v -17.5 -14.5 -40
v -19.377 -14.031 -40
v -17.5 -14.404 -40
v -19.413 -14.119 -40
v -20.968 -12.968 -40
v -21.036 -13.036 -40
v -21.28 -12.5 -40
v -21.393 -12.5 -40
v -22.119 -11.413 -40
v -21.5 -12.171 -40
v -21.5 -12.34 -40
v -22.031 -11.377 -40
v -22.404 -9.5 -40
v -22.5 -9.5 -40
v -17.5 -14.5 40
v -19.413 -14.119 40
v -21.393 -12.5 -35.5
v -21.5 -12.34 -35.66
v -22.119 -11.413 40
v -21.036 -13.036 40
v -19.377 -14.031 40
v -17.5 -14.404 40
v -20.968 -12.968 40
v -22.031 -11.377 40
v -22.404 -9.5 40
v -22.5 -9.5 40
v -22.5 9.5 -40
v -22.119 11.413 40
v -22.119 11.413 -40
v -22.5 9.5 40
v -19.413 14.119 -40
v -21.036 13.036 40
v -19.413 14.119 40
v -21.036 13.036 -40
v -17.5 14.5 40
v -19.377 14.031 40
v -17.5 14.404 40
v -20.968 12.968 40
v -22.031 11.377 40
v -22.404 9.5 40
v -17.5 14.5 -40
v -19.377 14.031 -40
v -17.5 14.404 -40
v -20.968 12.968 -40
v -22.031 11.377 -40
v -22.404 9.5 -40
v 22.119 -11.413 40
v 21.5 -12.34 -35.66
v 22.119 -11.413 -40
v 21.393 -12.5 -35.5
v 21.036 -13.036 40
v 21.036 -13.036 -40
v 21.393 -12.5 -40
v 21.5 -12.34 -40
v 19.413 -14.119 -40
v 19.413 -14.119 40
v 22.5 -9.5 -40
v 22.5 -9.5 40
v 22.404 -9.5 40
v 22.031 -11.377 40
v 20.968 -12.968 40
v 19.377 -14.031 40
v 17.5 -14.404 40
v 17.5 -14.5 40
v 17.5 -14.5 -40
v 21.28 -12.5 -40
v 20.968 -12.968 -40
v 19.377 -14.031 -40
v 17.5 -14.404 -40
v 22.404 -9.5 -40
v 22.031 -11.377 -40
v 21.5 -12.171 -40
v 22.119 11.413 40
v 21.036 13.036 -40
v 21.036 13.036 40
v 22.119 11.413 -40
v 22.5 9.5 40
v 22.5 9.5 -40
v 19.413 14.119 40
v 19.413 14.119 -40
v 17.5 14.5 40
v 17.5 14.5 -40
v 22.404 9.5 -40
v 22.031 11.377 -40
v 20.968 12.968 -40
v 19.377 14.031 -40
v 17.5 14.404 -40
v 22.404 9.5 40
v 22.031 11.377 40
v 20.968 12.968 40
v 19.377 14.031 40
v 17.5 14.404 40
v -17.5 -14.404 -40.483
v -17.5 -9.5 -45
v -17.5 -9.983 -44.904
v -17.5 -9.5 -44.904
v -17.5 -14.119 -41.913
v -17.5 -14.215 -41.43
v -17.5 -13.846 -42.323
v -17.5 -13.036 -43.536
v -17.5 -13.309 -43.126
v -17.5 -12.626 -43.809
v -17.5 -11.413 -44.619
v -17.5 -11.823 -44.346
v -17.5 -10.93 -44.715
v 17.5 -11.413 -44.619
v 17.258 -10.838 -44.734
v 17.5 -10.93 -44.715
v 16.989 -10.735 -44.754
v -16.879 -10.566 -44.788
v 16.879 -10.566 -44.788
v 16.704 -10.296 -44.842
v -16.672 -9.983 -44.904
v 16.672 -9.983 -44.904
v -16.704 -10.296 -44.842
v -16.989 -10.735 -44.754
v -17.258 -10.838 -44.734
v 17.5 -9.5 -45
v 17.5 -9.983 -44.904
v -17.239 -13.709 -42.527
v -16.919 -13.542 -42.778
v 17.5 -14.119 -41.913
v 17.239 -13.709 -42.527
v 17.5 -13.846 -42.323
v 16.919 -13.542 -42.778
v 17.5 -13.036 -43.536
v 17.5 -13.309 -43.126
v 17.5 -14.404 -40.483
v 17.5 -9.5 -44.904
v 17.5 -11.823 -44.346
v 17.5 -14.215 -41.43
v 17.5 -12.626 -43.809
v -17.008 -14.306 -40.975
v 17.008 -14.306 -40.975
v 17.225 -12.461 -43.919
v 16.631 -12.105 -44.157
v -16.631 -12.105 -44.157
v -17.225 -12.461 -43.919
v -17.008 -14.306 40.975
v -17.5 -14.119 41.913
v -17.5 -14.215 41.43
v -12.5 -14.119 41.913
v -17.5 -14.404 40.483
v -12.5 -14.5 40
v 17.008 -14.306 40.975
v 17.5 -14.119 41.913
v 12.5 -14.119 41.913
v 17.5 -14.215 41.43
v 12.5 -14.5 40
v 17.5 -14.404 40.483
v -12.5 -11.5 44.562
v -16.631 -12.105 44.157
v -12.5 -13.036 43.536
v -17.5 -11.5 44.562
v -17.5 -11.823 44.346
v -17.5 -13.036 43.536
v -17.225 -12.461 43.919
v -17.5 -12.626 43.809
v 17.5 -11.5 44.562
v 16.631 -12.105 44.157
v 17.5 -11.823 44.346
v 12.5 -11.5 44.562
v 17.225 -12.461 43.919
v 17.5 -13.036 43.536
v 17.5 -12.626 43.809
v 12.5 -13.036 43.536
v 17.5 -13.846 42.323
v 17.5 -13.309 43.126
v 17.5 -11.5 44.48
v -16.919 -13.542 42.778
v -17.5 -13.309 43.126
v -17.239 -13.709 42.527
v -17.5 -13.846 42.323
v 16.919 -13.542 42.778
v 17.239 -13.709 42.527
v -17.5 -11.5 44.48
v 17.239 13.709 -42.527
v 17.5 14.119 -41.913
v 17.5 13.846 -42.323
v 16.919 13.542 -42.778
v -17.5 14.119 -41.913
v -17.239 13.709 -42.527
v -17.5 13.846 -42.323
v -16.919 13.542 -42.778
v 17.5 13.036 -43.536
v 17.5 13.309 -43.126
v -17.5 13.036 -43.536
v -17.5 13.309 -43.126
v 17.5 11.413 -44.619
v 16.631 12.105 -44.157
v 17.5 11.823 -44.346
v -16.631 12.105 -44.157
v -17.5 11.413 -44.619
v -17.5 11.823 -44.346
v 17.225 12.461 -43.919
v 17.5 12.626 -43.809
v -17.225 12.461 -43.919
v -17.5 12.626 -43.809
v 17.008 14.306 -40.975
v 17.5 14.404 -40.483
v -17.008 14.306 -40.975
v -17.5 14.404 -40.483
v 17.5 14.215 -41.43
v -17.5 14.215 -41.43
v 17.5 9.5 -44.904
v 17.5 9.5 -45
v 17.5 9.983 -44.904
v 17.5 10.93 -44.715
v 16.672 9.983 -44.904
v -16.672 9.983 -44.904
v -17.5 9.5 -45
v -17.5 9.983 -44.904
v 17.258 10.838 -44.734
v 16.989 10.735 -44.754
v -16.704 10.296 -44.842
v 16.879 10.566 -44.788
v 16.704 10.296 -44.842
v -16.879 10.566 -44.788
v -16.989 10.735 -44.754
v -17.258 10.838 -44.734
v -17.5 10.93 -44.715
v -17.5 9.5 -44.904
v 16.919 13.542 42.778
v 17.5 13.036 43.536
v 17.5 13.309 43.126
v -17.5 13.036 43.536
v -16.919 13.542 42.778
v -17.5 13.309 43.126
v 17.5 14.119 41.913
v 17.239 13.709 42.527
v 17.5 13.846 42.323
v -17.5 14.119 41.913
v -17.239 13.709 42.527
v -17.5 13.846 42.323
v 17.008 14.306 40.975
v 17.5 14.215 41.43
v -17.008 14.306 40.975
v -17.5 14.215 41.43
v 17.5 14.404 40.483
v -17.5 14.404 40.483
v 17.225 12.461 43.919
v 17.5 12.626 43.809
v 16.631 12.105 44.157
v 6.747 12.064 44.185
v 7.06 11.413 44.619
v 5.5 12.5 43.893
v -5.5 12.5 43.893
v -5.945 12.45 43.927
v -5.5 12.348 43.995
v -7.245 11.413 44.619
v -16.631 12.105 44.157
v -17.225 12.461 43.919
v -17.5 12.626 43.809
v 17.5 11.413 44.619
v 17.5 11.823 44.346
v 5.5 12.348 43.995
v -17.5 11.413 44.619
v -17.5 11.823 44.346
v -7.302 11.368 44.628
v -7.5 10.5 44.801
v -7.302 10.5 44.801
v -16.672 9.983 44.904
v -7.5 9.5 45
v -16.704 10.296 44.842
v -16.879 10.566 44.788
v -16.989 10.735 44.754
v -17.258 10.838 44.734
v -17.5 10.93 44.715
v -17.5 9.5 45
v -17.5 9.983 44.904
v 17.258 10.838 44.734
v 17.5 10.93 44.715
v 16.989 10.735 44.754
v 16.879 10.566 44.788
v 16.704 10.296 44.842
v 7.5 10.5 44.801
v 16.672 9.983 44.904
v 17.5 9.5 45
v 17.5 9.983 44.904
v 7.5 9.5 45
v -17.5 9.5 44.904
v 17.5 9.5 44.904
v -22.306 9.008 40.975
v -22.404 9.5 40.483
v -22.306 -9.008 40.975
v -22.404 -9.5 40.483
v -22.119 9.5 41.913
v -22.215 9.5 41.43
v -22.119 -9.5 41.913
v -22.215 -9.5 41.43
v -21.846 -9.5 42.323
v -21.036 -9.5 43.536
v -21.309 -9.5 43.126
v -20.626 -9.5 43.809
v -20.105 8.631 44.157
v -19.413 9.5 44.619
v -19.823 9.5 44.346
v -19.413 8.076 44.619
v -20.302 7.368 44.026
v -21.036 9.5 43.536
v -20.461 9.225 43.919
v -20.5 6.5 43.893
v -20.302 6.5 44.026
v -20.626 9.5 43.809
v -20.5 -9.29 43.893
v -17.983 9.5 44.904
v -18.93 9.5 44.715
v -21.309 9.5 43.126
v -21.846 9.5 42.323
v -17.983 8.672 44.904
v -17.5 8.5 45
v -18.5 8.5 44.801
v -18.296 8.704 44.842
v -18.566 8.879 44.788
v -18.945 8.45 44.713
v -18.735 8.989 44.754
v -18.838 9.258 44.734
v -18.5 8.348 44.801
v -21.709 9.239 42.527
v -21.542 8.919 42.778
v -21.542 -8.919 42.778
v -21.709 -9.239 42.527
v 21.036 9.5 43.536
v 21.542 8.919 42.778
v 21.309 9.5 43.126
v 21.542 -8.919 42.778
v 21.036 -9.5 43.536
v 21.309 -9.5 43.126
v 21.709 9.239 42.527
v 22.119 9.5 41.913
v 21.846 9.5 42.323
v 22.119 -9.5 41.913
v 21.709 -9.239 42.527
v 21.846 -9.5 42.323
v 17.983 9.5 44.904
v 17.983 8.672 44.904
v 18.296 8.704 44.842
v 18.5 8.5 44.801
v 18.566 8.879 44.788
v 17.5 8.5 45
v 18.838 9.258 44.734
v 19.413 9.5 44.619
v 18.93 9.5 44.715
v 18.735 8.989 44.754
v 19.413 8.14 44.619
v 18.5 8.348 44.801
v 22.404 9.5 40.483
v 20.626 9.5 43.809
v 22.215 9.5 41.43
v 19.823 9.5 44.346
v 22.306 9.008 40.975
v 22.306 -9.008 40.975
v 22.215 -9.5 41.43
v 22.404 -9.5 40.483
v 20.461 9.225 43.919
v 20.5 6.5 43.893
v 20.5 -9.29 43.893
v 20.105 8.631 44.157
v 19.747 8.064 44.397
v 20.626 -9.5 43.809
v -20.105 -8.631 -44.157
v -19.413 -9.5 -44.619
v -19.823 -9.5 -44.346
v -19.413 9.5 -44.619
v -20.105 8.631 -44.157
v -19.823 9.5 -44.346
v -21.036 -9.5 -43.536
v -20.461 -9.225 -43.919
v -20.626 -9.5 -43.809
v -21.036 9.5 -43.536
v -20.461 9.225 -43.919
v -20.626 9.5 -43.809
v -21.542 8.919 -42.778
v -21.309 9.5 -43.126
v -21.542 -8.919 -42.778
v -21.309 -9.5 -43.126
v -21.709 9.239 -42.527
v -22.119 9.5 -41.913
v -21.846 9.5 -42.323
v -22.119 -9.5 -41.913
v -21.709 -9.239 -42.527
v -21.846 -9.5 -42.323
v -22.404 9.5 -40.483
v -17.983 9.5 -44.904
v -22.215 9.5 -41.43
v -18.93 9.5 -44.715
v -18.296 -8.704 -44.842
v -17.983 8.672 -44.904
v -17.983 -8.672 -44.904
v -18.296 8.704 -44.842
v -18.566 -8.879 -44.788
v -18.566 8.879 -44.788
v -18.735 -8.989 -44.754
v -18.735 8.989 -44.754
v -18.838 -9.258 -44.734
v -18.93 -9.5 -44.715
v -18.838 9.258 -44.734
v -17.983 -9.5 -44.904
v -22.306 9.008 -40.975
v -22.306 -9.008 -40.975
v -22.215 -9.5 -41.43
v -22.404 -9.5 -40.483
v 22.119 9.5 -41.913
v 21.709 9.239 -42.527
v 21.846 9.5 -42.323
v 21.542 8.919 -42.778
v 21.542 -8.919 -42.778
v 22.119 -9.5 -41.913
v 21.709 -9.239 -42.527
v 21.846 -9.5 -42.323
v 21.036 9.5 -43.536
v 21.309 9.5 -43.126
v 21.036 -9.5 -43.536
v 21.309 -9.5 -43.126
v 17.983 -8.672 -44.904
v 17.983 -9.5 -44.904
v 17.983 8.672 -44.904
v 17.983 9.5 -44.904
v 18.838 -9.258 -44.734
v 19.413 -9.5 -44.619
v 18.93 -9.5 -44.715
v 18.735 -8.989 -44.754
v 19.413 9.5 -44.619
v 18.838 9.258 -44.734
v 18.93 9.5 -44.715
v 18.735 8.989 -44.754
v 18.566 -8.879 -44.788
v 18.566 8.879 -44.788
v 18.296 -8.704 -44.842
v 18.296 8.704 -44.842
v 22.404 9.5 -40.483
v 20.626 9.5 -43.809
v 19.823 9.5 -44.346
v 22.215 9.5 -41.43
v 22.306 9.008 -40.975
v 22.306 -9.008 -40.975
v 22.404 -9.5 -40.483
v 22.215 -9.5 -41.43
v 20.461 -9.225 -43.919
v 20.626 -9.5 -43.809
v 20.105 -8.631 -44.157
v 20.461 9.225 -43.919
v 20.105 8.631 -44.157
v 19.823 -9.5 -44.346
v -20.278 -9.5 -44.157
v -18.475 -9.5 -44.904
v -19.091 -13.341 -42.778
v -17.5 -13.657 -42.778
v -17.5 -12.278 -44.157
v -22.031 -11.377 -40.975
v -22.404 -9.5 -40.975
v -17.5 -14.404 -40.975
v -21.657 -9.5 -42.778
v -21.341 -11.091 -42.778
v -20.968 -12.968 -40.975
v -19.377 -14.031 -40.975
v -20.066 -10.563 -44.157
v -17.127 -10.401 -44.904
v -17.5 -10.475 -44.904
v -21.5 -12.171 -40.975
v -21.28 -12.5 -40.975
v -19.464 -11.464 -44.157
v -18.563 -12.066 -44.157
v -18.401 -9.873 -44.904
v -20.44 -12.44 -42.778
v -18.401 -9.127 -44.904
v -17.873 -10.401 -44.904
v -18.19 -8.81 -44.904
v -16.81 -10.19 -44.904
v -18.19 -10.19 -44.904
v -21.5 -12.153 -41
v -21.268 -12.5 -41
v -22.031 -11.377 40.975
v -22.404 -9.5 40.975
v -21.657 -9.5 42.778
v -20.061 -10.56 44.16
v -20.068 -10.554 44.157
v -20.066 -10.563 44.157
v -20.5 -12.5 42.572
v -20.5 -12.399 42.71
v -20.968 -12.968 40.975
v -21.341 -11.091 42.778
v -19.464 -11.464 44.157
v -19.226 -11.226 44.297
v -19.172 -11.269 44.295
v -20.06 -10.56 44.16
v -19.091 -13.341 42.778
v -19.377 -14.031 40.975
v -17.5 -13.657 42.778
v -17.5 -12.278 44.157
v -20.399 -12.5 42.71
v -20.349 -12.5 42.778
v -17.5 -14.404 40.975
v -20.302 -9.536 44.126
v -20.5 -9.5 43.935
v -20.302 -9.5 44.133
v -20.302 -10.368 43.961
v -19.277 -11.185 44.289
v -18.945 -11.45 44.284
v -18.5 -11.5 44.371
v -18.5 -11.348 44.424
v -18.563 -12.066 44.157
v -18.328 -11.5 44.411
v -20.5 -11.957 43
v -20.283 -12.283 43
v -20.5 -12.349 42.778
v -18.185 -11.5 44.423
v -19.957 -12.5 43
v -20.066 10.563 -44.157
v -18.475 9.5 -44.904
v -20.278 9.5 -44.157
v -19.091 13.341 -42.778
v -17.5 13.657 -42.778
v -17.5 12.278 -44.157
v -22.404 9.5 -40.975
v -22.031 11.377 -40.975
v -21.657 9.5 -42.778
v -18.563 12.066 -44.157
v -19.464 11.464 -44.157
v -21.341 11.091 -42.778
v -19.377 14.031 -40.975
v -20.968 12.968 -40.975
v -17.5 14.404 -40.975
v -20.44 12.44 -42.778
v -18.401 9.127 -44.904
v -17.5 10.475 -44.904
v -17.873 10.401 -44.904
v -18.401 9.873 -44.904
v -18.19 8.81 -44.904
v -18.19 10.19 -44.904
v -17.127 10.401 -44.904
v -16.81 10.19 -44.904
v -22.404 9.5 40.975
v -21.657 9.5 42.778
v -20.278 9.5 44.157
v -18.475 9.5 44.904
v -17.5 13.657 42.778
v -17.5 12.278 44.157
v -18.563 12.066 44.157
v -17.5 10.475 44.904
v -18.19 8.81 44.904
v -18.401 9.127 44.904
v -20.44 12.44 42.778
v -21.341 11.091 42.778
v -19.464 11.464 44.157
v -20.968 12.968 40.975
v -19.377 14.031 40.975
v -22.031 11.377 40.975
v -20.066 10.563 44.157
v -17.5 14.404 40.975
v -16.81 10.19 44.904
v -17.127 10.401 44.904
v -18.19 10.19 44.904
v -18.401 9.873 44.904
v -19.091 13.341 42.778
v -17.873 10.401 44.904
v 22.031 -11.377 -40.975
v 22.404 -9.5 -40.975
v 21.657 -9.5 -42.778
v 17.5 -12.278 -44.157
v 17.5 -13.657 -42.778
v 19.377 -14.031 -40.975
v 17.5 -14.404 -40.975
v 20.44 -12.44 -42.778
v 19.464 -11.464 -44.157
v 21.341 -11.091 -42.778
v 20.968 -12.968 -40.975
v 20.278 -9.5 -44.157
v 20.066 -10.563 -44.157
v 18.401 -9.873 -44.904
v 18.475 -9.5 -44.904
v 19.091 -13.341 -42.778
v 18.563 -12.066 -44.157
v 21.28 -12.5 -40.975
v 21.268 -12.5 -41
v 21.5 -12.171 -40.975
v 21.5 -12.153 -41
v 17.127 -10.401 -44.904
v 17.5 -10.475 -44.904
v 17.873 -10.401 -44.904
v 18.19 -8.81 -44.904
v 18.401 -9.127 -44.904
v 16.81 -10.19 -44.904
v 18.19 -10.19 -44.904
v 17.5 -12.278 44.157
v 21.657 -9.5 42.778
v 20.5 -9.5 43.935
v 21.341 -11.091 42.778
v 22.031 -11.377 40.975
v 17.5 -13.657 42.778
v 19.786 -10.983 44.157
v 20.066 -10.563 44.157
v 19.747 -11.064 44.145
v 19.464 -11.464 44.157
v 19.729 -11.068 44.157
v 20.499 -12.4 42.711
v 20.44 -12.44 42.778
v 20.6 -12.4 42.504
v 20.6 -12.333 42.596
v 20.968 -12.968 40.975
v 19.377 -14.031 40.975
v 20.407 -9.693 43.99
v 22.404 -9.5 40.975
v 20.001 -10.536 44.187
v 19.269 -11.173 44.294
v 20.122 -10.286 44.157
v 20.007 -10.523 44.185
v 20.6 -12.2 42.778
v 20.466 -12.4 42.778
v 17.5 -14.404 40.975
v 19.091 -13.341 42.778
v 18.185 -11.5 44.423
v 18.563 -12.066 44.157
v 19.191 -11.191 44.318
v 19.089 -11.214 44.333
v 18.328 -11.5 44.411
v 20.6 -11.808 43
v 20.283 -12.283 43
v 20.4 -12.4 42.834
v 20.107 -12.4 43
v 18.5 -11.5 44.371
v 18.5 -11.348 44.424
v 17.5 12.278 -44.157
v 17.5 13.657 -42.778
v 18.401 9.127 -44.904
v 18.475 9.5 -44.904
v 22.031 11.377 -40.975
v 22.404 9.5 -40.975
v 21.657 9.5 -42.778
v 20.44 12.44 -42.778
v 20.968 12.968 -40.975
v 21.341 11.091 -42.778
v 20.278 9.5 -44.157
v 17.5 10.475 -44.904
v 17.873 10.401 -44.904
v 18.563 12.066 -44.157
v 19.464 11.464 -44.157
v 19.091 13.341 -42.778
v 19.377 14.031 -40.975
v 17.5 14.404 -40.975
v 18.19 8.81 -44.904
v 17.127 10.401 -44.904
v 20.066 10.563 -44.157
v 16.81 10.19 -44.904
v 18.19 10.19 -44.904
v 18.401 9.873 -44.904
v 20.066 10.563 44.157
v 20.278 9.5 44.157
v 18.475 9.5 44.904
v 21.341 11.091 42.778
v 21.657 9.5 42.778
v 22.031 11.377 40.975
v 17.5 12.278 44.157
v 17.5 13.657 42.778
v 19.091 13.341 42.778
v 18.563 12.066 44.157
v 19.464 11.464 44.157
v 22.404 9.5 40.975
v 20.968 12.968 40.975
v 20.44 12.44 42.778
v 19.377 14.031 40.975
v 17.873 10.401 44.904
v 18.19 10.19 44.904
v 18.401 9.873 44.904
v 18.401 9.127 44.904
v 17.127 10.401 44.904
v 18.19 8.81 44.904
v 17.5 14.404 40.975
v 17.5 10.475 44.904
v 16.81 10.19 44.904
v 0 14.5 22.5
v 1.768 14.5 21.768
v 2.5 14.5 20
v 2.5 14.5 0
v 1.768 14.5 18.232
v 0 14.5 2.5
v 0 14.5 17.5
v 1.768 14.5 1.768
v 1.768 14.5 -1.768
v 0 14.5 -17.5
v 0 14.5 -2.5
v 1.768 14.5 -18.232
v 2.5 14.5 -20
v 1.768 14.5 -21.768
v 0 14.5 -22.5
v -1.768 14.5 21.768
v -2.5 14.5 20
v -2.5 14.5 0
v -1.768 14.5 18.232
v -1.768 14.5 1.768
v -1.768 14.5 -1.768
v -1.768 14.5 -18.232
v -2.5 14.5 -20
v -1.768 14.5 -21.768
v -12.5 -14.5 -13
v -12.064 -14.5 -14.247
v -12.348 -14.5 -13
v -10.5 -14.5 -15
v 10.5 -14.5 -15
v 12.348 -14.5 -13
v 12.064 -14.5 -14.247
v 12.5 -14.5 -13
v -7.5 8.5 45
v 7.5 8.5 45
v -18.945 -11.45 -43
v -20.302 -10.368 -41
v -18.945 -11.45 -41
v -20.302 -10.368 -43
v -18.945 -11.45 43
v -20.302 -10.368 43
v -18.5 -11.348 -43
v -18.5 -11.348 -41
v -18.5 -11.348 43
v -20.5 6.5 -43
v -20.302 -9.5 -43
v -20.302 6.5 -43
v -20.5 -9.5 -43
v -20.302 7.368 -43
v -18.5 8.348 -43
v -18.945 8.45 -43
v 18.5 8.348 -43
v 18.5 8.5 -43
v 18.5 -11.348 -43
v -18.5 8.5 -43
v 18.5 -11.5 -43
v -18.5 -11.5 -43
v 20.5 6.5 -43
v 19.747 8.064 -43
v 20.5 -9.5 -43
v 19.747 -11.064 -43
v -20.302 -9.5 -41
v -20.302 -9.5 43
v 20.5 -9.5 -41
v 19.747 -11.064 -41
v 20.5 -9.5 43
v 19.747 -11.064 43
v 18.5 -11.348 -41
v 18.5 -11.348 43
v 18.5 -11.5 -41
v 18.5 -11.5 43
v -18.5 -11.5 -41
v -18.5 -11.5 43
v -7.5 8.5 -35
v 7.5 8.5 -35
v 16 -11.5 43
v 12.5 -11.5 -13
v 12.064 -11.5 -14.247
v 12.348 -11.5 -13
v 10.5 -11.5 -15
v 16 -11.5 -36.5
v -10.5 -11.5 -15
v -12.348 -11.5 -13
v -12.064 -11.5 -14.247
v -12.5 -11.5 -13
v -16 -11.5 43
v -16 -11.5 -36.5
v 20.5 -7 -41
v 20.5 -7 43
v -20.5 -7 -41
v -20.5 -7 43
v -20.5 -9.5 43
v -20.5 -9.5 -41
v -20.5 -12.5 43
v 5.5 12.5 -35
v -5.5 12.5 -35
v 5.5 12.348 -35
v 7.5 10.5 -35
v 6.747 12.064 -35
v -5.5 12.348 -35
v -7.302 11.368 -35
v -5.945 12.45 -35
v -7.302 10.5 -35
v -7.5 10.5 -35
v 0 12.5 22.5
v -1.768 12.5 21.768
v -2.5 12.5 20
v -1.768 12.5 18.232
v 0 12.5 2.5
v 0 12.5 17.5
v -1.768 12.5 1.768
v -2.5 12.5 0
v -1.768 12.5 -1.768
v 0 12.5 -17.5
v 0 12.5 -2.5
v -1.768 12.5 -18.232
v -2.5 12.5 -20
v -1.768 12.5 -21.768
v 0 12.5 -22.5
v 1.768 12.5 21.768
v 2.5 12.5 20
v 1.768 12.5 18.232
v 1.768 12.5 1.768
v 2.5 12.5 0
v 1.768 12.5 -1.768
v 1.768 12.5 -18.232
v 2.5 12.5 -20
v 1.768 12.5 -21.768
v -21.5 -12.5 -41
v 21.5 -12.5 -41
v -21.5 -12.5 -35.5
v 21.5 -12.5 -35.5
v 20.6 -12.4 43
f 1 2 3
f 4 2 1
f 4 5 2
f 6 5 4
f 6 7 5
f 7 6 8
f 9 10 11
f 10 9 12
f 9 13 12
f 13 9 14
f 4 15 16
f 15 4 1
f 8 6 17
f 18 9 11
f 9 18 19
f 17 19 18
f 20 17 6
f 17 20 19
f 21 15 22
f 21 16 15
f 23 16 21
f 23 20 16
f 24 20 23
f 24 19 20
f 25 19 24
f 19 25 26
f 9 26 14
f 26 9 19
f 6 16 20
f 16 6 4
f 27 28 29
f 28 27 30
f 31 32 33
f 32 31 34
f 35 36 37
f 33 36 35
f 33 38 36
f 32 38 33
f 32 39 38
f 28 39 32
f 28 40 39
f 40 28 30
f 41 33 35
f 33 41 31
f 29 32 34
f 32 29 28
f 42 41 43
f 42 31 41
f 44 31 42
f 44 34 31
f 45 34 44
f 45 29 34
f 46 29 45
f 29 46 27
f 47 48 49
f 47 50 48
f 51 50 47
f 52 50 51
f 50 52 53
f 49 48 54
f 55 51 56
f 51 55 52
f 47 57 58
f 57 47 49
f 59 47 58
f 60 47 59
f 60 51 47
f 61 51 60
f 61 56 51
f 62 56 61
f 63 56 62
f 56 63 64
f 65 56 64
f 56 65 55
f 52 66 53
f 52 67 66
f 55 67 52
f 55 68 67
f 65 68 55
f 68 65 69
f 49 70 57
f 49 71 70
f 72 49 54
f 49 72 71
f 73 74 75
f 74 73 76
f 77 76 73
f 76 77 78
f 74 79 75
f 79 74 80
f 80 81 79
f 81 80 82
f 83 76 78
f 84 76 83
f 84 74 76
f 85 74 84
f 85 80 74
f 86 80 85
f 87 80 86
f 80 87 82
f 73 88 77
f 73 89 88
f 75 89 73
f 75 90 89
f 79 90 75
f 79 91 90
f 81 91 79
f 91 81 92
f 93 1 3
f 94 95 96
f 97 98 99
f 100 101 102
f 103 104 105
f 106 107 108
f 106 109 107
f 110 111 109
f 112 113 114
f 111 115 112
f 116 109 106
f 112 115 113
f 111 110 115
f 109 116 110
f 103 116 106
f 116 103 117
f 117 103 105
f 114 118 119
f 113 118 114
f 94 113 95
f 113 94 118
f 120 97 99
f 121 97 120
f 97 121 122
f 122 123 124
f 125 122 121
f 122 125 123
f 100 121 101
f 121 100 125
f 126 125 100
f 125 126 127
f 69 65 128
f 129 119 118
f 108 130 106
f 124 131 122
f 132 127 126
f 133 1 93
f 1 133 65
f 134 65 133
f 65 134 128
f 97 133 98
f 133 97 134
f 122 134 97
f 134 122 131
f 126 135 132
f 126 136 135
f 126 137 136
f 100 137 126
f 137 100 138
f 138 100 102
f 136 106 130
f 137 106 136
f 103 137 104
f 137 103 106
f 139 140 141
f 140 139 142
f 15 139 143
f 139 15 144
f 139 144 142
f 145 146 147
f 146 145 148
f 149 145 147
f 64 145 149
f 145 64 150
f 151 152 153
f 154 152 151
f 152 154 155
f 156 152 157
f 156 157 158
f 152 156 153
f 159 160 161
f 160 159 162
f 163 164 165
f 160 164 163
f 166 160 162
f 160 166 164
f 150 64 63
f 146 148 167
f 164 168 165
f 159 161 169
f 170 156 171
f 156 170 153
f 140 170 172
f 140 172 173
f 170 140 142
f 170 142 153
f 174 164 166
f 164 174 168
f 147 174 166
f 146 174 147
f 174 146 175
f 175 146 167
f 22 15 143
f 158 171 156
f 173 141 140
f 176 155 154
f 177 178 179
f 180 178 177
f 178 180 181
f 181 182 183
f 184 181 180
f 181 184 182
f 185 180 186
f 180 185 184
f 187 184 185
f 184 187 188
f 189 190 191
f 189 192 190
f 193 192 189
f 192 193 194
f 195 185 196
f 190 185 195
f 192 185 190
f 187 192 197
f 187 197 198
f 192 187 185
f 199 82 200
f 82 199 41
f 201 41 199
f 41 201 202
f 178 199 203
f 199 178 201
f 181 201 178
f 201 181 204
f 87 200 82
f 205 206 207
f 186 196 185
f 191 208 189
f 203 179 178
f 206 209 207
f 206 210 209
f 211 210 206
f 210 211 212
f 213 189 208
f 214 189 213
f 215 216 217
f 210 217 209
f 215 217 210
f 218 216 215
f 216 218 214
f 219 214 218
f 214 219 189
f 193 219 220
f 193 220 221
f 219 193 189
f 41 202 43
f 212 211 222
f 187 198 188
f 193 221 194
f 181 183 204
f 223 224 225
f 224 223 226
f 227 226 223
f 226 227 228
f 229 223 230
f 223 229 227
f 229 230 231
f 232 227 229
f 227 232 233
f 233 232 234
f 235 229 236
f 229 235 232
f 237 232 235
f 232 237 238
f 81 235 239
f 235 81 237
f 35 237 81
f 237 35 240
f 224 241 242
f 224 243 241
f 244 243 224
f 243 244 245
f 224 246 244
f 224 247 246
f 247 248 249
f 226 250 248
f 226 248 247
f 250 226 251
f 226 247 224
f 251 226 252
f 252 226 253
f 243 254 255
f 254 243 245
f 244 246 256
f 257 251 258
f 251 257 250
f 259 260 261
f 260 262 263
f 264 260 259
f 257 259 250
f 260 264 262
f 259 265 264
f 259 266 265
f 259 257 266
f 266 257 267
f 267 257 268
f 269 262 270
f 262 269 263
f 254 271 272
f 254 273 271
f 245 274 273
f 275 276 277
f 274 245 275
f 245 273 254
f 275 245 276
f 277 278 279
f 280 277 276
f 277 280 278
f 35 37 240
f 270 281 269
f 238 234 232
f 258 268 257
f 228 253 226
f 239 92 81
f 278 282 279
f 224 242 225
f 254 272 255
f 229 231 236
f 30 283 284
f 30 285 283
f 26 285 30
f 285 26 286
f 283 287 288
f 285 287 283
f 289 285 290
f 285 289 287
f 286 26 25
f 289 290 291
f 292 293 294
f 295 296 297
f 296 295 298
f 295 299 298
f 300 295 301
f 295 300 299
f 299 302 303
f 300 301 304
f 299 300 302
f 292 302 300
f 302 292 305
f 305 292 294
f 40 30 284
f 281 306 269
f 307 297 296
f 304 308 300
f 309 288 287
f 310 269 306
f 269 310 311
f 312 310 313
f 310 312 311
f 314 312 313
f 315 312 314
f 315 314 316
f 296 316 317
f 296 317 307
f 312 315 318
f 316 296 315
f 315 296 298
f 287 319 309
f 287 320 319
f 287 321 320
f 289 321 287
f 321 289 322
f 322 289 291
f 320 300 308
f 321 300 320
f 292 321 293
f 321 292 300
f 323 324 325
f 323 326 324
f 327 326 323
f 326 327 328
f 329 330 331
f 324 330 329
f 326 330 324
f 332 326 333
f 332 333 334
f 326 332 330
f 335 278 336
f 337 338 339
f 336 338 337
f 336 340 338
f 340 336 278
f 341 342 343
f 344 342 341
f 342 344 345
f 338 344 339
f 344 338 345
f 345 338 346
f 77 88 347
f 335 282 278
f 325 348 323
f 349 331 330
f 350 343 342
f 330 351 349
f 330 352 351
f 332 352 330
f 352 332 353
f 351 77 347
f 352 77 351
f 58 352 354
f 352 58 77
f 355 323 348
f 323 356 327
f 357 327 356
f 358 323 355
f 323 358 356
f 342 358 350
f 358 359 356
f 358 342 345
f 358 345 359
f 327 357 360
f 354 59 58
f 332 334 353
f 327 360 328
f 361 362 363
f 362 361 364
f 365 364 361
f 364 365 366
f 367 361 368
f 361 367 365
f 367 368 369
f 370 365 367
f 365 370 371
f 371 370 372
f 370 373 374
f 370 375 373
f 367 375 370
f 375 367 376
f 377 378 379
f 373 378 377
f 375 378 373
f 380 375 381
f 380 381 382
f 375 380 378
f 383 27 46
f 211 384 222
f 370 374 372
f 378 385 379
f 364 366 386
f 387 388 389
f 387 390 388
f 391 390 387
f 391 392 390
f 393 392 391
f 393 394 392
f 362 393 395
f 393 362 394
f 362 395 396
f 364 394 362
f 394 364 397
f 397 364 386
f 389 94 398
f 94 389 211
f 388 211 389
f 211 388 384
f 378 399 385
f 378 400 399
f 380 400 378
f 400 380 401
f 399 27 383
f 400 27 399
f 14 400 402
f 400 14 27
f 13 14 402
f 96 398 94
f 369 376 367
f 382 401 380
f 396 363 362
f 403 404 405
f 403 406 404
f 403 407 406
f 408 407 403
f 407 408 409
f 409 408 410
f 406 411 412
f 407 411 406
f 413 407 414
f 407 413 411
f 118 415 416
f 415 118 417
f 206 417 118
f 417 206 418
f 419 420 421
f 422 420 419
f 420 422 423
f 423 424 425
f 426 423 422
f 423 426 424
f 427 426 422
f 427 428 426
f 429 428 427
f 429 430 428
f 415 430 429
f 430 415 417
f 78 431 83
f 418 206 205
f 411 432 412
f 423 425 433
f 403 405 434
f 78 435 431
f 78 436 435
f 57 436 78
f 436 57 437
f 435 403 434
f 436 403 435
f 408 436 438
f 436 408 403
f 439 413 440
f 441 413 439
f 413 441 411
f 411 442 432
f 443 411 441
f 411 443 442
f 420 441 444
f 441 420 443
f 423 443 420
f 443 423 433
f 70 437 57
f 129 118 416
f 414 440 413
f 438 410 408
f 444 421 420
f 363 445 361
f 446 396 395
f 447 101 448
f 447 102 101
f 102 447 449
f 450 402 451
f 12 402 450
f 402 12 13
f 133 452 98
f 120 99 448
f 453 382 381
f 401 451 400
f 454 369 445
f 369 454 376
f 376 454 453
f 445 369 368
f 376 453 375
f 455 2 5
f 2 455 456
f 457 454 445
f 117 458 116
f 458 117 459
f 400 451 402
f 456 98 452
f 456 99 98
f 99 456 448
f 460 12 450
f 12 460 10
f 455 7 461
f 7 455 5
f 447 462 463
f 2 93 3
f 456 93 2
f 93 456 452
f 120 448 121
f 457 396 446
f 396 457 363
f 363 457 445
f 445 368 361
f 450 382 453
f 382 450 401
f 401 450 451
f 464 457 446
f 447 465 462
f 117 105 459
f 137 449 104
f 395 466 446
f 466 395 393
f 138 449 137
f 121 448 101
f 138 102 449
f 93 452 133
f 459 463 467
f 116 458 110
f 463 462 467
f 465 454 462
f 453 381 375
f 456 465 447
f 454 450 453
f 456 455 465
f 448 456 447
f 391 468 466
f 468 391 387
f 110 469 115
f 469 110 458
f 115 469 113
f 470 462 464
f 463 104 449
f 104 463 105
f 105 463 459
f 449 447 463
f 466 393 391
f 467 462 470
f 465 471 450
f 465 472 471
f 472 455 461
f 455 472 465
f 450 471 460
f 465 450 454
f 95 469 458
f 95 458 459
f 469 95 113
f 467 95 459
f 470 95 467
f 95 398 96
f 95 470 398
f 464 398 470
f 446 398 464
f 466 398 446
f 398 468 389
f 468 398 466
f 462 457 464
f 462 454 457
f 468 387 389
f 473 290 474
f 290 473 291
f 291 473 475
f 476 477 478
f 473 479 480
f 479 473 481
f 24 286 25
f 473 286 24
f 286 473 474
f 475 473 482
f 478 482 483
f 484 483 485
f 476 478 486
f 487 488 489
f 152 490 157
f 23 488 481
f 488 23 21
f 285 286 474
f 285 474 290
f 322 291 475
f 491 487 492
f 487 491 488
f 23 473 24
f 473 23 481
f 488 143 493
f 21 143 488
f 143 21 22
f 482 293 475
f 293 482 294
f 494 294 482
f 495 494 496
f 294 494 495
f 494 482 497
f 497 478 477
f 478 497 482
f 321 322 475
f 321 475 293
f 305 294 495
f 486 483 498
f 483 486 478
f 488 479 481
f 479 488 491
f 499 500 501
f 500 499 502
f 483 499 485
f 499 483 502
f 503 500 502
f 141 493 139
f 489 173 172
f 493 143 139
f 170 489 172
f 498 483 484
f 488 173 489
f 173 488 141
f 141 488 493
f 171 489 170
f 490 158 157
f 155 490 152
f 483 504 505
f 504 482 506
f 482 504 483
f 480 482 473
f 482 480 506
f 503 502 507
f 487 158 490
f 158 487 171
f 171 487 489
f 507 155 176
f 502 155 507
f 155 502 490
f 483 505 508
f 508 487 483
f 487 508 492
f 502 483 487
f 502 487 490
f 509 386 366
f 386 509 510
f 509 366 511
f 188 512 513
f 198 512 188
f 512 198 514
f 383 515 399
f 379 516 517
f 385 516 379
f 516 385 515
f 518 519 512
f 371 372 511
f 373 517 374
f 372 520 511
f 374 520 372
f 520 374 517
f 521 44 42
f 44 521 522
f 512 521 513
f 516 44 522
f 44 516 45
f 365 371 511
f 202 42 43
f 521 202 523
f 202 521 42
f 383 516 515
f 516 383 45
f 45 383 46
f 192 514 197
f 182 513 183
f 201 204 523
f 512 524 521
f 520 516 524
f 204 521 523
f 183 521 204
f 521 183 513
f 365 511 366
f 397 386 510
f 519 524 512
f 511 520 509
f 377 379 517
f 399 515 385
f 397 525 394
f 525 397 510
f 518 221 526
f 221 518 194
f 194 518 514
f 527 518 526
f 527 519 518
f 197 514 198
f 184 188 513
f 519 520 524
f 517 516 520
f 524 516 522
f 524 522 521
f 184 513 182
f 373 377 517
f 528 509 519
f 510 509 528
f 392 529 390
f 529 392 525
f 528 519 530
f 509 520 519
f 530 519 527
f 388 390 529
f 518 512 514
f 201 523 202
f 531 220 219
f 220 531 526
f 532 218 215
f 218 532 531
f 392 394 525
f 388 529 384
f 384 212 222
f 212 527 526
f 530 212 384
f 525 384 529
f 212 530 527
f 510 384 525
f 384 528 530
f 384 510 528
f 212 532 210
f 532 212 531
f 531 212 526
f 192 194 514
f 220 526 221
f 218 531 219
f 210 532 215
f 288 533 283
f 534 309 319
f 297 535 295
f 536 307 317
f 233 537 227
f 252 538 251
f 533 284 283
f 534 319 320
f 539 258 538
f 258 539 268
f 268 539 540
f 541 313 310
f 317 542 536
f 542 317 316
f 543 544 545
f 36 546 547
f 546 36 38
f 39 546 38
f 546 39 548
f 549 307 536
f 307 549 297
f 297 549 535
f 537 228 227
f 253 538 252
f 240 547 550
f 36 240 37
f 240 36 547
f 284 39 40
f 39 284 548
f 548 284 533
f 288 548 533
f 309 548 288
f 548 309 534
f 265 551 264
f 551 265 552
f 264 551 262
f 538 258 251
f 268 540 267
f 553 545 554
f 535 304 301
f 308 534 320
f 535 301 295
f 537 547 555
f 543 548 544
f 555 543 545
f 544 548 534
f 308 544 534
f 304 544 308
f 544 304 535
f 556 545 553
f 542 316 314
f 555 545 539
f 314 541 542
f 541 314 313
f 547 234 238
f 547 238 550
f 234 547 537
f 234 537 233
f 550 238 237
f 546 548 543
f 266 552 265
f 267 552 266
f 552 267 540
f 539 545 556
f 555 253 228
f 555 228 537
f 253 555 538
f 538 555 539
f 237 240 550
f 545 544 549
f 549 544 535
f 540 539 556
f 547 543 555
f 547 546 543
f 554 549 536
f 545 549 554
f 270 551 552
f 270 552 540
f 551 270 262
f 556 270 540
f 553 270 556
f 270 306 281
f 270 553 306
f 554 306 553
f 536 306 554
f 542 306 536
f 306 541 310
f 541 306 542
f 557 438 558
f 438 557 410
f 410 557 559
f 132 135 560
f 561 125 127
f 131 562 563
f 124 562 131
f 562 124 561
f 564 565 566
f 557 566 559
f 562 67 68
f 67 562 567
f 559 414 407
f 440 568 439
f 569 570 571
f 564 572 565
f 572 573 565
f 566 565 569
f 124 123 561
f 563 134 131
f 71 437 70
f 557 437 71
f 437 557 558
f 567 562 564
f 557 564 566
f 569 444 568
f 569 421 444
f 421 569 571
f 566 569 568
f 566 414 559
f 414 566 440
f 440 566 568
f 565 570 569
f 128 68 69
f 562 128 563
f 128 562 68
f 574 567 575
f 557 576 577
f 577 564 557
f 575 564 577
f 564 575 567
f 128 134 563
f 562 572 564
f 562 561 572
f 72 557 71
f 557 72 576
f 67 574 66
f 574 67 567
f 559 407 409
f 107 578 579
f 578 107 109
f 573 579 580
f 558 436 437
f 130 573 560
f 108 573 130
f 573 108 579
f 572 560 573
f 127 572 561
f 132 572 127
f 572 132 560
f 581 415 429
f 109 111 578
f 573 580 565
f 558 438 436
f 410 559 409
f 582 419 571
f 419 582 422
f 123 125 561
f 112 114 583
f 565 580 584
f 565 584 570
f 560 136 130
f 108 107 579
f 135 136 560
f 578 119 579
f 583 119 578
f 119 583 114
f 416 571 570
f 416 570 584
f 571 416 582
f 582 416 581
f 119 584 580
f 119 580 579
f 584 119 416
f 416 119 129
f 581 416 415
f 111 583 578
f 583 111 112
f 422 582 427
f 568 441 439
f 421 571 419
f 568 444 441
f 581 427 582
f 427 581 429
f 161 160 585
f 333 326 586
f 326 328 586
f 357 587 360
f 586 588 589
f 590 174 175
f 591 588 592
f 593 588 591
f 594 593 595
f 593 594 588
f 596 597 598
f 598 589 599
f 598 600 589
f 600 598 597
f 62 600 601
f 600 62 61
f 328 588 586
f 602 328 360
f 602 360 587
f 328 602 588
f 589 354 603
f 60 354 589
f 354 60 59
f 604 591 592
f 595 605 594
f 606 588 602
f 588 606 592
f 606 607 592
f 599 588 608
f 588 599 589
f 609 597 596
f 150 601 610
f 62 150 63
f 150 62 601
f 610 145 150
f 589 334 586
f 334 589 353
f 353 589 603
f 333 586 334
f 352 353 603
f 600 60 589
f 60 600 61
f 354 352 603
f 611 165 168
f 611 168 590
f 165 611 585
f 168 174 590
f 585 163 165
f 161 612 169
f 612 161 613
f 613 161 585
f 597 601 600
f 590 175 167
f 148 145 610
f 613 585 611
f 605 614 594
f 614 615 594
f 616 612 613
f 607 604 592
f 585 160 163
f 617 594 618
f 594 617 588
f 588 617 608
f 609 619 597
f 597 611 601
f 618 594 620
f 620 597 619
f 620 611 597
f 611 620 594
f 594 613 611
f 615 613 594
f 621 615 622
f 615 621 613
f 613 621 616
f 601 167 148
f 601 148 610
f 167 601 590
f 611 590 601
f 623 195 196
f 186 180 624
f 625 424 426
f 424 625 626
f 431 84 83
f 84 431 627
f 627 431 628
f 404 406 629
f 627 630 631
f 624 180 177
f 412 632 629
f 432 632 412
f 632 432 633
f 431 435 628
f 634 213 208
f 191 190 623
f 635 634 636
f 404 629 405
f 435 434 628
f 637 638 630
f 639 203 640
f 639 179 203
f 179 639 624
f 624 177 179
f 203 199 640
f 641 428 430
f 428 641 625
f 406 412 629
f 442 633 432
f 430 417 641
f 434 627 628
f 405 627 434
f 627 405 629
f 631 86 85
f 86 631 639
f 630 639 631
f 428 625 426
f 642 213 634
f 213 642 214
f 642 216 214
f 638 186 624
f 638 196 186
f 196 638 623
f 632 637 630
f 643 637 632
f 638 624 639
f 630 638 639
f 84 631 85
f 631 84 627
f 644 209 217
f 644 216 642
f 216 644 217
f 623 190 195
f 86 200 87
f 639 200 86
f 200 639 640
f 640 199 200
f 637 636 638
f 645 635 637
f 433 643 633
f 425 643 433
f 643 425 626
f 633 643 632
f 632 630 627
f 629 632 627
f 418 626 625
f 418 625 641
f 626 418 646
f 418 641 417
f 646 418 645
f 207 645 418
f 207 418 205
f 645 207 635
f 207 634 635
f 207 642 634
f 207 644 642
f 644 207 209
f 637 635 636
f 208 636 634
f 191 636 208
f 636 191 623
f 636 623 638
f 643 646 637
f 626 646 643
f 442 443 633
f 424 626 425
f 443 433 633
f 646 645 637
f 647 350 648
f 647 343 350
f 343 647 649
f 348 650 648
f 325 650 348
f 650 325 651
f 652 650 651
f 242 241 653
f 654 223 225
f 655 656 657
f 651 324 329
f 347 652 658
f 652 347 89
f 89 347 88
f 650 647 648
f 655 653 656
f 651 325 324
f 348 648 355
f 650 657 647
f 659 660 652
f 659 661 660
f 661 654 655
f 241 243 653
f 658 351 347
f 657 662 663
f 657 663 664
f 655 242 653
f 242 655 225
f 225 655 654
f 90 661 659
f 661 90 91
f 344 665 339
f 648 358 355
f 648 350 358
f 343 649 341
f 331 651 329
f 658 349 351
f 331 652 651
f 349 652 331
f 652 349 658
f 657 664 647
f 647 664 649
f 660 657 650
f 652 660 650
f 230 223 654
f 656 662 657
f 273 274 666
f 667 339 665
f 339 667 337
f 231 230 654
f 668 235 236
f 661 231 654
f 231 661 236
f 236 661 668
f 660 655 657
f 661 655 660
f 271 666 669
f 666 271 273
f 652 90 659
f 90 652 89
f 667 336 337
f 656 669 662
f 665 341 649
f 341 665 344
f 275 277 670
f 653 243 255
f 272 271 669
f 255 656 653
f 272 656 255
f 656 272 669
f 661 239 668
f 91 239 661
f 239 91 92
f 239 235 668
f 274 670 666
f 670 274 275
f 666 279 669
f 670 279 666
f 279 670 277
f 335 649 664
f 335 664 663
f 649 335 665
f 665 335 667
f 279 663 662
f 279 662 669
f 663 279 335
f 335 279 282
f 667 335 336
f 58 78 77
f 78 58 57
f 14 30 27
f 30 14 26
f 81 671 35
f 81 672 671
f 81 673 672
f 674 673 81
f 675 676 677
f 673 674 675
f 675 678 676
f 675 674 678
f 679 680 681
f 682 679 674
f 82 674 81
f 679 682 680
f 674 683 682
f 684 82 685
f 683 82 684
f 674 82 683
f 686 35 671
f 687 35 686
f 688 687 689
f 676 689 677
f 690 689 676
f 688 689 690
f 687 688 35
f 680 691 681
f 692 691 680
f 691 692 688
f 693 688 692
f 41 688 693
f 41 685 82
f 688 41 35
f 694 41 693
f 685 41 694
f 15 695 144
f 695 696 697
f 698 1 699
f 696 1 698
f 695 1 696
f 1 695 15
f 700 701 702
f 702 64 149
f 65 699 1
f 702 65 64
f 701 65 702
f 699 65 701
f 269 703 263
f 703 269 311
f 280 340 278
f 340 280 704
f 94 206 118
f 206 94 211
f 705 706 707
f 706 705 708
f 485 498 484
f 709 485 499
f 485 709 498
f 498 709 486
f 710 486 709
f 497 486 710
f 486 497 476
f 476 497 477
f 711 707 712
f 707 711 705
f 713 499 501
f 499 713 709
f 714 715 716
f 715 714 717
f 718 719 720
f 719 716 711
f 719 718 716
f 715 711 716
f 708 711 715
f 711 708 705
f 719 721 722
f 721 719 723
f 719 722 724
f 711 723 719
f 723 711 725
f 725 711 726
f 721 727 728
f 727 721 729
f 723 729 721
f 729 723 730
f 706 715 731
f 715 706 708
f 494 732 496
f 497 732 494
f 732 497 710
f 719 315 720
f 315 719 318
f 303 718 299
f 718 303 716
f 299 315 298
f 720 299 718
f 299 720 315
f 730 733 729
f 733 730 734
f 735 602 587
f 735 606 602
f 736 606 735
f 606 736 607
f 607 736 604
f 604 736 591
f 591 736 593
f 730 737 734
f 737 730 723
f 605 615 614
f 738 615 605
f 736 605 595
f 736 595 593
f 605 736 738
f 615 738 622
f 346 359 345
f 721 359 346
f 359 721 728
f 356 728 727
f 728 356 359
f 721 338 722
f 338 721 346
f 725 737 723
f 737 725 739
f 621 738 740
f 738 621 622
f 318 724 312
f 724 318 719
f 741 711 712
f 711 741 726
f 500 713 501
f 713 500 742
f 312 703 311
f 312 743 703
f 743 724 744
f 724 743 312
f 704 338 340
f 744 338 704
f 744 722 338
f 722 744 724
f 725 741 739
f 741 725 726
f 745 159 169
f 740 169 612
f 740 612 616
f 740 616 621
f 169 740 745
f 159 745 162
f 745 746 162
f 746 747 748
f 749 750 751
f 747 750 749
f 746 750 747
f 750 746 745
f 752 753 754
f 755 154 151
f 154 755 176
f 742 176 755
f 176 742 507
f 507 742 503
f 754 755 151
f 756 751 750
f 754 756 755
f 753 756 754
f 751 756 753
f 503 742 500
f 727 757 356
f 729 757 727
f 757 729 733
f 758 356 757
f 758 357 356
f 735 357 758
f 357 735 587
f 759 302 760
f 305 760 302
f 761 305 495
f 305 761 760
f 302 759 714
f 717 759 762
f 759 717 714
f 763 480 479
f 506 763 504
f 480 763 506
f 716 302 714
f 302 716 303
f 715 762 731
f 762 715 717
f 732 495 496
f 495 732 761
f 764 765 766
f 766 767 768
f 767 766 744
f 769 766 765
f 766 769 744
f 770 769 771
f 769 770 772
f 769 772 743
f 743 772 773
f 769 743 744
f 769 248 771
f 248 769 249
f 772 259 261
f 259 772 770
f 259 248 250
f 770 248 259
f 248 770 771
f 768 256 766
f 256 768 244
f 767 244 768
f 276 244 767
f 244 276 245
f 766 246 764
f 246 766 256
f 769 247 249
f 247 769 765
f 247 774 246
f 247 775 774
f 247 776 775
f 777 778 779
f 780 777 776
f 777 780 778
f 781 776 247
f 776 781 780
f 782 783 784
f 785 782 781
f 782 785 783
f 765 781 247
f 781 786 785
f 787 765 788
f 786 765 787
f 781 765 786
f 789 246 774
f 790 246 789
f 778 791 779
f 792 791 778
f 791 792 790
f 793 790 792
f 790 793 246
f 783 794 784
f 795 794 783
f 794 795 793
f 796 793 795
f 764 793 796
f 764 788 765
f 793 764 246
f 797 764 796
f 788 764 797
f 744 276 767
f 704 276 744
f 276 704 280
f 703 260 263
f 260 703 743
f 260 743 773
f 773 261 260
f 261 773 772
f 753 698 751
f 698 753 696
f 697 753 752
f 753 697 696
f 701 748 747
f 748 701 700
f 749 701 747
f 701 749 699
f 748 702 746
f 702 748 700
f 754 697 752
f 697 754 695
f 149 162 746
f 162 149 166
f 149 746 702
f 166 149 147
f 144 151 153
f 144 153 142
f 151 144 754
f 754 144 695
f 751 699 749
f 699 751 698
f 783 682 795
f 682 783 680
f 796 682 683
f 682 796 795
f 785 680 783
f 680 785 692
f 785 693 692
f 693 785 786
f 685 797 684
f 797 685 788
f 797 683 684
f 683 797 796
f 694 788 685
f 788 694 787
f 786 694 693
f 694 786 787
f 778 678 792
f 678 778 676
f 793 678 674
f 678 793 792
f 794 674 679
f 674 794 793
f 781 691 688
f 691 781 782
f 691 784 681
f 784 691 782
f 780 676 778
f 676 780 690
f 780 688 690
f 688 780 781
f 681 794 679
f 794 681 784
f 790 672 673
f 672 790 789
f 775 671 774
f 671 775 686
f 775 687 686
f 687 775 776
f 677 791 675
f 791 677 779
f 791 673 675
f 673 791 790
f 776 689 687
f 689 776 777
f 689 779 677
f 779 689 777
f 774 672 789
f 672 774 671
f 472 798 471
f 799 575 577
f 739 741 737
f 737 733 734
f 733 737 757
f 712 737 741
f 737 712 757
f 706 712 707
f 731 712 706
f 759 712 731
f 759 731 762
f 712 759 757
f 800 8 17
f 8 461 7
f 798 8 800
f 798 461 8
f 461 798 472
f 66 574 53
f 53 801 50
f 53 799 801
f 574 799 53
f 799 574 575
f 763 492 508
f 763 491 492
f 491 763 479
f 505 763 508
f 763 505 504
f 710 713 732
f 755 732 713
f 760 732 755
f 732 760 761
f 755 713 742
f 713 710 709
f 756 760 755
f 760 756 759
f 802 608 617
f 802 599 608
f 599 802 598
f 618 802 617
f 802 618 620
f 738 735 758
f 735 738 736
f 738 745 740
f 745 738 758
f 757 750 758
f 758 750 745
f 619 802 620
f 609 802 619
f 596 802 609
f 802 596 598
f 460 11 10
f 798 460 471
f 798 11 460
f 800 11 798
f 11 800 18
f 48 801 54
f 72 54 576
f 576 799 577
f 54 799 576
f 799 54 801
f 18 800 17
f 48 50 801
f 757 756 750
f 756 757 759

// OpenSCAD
//--------------------------------------------------------------------
//	Filename:	RemoteControlHolder.scad
//	Author:		Robert H. Morrison (rhmorrison)
//	Created On:	15 October 2011
//--------------------------------------------------------------------

use <MCAD/boxes.scad>;

AddTriangles=1;	//[0:No,1:Yes]

KT=20;			// Remote Control Thickness
ST=5;			// Screw head Thickness
T=2;			// Thickness of walls
BD=KT+ST+2*T;	// Box Depth
BW=45;			// Box Width
BL=90;			// Box Length
FW=25;			// Front Hole Width

module Triangle(h) {
	linear_extrude(height=h, center=false, convexity=10, twist=0)
		polygon(
			points=[[0,0],[0,5.5],[5.5,5.5]],
			paths=[[0,1,2]]);
}

module BracketHoles() {
	for (i=[-20, 0, 20])
	{
		translate([0,KT/2,i])
			rotate([90,0,0])
				cylinder(h=KT, r=2.5, center=true);
	}
}

module RemoteControlBracket() {
	union() {
		difference() {
			roundedBox([BW,BD,BL], 5, false);			// Holder frame
			translate([0,-(ST-T)/2,T])
				roundedBox([BW-2*T,KT,BL], 2, true);	// Remote Control
			translate([0,ST/2,10])
				roundedBox([BW/3,KT,BL], 2, true);  	// Screw heads
			translate([0,-(KT+ST+T)/2,30])
				rotate([90,90,0])
					roundedBox([BL,FW,ST], 2, true);  // Cut-out FRONT
			BracketHoles();
		}

		if (AddTriangles)
		{
			translate([T+5.5-BW/2,T-BD/2,2*T-BL/2])
				rotate([0,0,90])
					Triangle(BL-T*3);						// LL corner
			translate([BW/2-T+0.1,T+5.6-BD/2,2*T-BL/2])
				rotate([0,0,180])
					Triangle(BL-T*3);						// LR corner
			translate([T/2-BW/2, 5.5+T-BD/2, 6-T-BL/2])
				rotate([0,90,0])
					rotate([0,0,180])
						Triangle(BW-T);					// Bottom
		}
	}
}

RemoteControlBracket();
